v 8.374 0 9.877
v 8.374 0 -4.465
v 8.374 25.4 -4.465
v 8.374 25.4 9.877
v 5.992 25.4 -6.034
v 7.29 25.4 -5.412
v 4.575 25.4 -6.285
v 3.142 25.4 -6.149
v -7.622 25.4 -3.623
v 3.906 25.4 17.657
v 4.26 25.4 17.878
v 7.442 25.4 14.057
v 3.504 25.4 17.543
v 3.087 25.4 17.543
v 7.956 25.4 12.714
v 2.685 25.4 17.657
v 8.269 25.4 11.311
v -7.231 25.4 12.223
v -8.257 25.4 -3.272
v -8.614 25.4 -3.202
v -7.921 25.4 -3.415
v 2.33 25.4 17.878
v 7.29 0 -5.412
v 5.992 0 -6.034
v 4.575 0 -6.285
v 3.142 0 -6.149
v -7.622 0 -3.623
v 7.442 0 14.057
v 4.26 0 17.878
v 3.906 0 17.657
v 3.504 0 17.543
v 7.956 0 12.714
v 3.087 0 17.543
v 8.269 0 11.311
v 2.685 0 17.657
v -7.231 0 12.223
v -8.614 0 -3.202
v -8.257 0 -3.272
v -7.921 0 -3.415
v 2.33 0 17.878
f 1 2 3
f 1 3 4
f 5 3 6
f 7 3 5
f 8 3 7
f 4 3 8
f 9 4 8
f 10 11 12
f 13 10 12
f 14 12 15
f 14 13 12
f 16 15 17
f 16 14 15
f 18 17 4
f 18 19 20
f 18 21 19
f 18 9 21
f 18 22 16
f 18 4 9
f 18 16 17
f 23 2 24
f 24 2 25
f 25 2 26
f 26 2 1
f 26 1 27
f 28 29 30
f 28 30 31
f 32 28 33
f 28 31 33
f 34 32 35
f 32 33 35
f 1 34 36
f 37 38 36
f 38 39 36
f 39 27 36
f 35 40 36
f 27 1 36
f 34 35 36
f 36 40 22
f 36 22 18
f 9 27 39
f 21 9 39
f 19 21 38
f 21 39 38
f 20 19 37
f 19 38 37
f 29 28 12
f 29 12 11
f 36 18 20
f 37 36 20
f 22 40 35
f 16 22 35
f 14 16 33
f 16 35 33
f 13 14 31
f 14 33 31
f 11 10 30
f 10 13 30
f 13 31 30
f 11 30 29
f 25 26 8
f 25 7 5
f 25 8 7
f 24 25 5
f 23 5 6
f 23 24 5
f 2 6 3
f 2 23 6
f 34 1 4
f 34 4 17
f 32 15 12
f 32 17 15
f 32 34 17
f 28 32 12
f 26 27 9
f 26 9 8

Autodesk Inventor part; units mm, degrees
ref_plane "YZ Plane" through (0, 0, 0) normal (1, 0, 0) x (0, 1, 0)
ref_plane "XZ Plane" through (0, 0, 0) normal (0, 1, 0) x (-1, 0, 0)
ref_plane "XY Plane" through (0, 0, 0) normal (0, 0, 1) x (1, 0, 0)
sketch "Sketch1" plane through (0, 0, 0) normal (0, 1, 0) x (-1, 0, 0)
  line L0 (7.2314, 12.2227) -> (8.6145, -3.2023)
  arc A0 (8.6145, -3.2023) -> (7.6223, -3.6232) centre (8.7714, -4.952) ccw
  line L1 (7.6223, -3.6232) -> (-3.1421, -6.1489)
  arc A1 (-8.374, -4.4651) -> (-3.1421, -6.1489) centre (-4.3594, -0.9611) ccw
  line L2 (-8.374, -4.4651) -> (-8.374, 9.8774)
  arc A2 (-7.4419, 14.0569) -> (-8.374, 9.8774) centre (1.4622, 9.8774) ccw
  line L3 (-7.4419, 14.0569) -> (-4.2604, 17.8775)
  arc A3 (-4.2604, 17.8775) -> (-2.3303, 17.8775) centre (-3.2954, 19.0365) ccw
  line L4 (-2.3303, 17.8775) -> (7.2314, 12.2227)
  point P0 (0, 0)
extrude "Extrusion1" add sketch "Sketch1" along normal blind 25.4
